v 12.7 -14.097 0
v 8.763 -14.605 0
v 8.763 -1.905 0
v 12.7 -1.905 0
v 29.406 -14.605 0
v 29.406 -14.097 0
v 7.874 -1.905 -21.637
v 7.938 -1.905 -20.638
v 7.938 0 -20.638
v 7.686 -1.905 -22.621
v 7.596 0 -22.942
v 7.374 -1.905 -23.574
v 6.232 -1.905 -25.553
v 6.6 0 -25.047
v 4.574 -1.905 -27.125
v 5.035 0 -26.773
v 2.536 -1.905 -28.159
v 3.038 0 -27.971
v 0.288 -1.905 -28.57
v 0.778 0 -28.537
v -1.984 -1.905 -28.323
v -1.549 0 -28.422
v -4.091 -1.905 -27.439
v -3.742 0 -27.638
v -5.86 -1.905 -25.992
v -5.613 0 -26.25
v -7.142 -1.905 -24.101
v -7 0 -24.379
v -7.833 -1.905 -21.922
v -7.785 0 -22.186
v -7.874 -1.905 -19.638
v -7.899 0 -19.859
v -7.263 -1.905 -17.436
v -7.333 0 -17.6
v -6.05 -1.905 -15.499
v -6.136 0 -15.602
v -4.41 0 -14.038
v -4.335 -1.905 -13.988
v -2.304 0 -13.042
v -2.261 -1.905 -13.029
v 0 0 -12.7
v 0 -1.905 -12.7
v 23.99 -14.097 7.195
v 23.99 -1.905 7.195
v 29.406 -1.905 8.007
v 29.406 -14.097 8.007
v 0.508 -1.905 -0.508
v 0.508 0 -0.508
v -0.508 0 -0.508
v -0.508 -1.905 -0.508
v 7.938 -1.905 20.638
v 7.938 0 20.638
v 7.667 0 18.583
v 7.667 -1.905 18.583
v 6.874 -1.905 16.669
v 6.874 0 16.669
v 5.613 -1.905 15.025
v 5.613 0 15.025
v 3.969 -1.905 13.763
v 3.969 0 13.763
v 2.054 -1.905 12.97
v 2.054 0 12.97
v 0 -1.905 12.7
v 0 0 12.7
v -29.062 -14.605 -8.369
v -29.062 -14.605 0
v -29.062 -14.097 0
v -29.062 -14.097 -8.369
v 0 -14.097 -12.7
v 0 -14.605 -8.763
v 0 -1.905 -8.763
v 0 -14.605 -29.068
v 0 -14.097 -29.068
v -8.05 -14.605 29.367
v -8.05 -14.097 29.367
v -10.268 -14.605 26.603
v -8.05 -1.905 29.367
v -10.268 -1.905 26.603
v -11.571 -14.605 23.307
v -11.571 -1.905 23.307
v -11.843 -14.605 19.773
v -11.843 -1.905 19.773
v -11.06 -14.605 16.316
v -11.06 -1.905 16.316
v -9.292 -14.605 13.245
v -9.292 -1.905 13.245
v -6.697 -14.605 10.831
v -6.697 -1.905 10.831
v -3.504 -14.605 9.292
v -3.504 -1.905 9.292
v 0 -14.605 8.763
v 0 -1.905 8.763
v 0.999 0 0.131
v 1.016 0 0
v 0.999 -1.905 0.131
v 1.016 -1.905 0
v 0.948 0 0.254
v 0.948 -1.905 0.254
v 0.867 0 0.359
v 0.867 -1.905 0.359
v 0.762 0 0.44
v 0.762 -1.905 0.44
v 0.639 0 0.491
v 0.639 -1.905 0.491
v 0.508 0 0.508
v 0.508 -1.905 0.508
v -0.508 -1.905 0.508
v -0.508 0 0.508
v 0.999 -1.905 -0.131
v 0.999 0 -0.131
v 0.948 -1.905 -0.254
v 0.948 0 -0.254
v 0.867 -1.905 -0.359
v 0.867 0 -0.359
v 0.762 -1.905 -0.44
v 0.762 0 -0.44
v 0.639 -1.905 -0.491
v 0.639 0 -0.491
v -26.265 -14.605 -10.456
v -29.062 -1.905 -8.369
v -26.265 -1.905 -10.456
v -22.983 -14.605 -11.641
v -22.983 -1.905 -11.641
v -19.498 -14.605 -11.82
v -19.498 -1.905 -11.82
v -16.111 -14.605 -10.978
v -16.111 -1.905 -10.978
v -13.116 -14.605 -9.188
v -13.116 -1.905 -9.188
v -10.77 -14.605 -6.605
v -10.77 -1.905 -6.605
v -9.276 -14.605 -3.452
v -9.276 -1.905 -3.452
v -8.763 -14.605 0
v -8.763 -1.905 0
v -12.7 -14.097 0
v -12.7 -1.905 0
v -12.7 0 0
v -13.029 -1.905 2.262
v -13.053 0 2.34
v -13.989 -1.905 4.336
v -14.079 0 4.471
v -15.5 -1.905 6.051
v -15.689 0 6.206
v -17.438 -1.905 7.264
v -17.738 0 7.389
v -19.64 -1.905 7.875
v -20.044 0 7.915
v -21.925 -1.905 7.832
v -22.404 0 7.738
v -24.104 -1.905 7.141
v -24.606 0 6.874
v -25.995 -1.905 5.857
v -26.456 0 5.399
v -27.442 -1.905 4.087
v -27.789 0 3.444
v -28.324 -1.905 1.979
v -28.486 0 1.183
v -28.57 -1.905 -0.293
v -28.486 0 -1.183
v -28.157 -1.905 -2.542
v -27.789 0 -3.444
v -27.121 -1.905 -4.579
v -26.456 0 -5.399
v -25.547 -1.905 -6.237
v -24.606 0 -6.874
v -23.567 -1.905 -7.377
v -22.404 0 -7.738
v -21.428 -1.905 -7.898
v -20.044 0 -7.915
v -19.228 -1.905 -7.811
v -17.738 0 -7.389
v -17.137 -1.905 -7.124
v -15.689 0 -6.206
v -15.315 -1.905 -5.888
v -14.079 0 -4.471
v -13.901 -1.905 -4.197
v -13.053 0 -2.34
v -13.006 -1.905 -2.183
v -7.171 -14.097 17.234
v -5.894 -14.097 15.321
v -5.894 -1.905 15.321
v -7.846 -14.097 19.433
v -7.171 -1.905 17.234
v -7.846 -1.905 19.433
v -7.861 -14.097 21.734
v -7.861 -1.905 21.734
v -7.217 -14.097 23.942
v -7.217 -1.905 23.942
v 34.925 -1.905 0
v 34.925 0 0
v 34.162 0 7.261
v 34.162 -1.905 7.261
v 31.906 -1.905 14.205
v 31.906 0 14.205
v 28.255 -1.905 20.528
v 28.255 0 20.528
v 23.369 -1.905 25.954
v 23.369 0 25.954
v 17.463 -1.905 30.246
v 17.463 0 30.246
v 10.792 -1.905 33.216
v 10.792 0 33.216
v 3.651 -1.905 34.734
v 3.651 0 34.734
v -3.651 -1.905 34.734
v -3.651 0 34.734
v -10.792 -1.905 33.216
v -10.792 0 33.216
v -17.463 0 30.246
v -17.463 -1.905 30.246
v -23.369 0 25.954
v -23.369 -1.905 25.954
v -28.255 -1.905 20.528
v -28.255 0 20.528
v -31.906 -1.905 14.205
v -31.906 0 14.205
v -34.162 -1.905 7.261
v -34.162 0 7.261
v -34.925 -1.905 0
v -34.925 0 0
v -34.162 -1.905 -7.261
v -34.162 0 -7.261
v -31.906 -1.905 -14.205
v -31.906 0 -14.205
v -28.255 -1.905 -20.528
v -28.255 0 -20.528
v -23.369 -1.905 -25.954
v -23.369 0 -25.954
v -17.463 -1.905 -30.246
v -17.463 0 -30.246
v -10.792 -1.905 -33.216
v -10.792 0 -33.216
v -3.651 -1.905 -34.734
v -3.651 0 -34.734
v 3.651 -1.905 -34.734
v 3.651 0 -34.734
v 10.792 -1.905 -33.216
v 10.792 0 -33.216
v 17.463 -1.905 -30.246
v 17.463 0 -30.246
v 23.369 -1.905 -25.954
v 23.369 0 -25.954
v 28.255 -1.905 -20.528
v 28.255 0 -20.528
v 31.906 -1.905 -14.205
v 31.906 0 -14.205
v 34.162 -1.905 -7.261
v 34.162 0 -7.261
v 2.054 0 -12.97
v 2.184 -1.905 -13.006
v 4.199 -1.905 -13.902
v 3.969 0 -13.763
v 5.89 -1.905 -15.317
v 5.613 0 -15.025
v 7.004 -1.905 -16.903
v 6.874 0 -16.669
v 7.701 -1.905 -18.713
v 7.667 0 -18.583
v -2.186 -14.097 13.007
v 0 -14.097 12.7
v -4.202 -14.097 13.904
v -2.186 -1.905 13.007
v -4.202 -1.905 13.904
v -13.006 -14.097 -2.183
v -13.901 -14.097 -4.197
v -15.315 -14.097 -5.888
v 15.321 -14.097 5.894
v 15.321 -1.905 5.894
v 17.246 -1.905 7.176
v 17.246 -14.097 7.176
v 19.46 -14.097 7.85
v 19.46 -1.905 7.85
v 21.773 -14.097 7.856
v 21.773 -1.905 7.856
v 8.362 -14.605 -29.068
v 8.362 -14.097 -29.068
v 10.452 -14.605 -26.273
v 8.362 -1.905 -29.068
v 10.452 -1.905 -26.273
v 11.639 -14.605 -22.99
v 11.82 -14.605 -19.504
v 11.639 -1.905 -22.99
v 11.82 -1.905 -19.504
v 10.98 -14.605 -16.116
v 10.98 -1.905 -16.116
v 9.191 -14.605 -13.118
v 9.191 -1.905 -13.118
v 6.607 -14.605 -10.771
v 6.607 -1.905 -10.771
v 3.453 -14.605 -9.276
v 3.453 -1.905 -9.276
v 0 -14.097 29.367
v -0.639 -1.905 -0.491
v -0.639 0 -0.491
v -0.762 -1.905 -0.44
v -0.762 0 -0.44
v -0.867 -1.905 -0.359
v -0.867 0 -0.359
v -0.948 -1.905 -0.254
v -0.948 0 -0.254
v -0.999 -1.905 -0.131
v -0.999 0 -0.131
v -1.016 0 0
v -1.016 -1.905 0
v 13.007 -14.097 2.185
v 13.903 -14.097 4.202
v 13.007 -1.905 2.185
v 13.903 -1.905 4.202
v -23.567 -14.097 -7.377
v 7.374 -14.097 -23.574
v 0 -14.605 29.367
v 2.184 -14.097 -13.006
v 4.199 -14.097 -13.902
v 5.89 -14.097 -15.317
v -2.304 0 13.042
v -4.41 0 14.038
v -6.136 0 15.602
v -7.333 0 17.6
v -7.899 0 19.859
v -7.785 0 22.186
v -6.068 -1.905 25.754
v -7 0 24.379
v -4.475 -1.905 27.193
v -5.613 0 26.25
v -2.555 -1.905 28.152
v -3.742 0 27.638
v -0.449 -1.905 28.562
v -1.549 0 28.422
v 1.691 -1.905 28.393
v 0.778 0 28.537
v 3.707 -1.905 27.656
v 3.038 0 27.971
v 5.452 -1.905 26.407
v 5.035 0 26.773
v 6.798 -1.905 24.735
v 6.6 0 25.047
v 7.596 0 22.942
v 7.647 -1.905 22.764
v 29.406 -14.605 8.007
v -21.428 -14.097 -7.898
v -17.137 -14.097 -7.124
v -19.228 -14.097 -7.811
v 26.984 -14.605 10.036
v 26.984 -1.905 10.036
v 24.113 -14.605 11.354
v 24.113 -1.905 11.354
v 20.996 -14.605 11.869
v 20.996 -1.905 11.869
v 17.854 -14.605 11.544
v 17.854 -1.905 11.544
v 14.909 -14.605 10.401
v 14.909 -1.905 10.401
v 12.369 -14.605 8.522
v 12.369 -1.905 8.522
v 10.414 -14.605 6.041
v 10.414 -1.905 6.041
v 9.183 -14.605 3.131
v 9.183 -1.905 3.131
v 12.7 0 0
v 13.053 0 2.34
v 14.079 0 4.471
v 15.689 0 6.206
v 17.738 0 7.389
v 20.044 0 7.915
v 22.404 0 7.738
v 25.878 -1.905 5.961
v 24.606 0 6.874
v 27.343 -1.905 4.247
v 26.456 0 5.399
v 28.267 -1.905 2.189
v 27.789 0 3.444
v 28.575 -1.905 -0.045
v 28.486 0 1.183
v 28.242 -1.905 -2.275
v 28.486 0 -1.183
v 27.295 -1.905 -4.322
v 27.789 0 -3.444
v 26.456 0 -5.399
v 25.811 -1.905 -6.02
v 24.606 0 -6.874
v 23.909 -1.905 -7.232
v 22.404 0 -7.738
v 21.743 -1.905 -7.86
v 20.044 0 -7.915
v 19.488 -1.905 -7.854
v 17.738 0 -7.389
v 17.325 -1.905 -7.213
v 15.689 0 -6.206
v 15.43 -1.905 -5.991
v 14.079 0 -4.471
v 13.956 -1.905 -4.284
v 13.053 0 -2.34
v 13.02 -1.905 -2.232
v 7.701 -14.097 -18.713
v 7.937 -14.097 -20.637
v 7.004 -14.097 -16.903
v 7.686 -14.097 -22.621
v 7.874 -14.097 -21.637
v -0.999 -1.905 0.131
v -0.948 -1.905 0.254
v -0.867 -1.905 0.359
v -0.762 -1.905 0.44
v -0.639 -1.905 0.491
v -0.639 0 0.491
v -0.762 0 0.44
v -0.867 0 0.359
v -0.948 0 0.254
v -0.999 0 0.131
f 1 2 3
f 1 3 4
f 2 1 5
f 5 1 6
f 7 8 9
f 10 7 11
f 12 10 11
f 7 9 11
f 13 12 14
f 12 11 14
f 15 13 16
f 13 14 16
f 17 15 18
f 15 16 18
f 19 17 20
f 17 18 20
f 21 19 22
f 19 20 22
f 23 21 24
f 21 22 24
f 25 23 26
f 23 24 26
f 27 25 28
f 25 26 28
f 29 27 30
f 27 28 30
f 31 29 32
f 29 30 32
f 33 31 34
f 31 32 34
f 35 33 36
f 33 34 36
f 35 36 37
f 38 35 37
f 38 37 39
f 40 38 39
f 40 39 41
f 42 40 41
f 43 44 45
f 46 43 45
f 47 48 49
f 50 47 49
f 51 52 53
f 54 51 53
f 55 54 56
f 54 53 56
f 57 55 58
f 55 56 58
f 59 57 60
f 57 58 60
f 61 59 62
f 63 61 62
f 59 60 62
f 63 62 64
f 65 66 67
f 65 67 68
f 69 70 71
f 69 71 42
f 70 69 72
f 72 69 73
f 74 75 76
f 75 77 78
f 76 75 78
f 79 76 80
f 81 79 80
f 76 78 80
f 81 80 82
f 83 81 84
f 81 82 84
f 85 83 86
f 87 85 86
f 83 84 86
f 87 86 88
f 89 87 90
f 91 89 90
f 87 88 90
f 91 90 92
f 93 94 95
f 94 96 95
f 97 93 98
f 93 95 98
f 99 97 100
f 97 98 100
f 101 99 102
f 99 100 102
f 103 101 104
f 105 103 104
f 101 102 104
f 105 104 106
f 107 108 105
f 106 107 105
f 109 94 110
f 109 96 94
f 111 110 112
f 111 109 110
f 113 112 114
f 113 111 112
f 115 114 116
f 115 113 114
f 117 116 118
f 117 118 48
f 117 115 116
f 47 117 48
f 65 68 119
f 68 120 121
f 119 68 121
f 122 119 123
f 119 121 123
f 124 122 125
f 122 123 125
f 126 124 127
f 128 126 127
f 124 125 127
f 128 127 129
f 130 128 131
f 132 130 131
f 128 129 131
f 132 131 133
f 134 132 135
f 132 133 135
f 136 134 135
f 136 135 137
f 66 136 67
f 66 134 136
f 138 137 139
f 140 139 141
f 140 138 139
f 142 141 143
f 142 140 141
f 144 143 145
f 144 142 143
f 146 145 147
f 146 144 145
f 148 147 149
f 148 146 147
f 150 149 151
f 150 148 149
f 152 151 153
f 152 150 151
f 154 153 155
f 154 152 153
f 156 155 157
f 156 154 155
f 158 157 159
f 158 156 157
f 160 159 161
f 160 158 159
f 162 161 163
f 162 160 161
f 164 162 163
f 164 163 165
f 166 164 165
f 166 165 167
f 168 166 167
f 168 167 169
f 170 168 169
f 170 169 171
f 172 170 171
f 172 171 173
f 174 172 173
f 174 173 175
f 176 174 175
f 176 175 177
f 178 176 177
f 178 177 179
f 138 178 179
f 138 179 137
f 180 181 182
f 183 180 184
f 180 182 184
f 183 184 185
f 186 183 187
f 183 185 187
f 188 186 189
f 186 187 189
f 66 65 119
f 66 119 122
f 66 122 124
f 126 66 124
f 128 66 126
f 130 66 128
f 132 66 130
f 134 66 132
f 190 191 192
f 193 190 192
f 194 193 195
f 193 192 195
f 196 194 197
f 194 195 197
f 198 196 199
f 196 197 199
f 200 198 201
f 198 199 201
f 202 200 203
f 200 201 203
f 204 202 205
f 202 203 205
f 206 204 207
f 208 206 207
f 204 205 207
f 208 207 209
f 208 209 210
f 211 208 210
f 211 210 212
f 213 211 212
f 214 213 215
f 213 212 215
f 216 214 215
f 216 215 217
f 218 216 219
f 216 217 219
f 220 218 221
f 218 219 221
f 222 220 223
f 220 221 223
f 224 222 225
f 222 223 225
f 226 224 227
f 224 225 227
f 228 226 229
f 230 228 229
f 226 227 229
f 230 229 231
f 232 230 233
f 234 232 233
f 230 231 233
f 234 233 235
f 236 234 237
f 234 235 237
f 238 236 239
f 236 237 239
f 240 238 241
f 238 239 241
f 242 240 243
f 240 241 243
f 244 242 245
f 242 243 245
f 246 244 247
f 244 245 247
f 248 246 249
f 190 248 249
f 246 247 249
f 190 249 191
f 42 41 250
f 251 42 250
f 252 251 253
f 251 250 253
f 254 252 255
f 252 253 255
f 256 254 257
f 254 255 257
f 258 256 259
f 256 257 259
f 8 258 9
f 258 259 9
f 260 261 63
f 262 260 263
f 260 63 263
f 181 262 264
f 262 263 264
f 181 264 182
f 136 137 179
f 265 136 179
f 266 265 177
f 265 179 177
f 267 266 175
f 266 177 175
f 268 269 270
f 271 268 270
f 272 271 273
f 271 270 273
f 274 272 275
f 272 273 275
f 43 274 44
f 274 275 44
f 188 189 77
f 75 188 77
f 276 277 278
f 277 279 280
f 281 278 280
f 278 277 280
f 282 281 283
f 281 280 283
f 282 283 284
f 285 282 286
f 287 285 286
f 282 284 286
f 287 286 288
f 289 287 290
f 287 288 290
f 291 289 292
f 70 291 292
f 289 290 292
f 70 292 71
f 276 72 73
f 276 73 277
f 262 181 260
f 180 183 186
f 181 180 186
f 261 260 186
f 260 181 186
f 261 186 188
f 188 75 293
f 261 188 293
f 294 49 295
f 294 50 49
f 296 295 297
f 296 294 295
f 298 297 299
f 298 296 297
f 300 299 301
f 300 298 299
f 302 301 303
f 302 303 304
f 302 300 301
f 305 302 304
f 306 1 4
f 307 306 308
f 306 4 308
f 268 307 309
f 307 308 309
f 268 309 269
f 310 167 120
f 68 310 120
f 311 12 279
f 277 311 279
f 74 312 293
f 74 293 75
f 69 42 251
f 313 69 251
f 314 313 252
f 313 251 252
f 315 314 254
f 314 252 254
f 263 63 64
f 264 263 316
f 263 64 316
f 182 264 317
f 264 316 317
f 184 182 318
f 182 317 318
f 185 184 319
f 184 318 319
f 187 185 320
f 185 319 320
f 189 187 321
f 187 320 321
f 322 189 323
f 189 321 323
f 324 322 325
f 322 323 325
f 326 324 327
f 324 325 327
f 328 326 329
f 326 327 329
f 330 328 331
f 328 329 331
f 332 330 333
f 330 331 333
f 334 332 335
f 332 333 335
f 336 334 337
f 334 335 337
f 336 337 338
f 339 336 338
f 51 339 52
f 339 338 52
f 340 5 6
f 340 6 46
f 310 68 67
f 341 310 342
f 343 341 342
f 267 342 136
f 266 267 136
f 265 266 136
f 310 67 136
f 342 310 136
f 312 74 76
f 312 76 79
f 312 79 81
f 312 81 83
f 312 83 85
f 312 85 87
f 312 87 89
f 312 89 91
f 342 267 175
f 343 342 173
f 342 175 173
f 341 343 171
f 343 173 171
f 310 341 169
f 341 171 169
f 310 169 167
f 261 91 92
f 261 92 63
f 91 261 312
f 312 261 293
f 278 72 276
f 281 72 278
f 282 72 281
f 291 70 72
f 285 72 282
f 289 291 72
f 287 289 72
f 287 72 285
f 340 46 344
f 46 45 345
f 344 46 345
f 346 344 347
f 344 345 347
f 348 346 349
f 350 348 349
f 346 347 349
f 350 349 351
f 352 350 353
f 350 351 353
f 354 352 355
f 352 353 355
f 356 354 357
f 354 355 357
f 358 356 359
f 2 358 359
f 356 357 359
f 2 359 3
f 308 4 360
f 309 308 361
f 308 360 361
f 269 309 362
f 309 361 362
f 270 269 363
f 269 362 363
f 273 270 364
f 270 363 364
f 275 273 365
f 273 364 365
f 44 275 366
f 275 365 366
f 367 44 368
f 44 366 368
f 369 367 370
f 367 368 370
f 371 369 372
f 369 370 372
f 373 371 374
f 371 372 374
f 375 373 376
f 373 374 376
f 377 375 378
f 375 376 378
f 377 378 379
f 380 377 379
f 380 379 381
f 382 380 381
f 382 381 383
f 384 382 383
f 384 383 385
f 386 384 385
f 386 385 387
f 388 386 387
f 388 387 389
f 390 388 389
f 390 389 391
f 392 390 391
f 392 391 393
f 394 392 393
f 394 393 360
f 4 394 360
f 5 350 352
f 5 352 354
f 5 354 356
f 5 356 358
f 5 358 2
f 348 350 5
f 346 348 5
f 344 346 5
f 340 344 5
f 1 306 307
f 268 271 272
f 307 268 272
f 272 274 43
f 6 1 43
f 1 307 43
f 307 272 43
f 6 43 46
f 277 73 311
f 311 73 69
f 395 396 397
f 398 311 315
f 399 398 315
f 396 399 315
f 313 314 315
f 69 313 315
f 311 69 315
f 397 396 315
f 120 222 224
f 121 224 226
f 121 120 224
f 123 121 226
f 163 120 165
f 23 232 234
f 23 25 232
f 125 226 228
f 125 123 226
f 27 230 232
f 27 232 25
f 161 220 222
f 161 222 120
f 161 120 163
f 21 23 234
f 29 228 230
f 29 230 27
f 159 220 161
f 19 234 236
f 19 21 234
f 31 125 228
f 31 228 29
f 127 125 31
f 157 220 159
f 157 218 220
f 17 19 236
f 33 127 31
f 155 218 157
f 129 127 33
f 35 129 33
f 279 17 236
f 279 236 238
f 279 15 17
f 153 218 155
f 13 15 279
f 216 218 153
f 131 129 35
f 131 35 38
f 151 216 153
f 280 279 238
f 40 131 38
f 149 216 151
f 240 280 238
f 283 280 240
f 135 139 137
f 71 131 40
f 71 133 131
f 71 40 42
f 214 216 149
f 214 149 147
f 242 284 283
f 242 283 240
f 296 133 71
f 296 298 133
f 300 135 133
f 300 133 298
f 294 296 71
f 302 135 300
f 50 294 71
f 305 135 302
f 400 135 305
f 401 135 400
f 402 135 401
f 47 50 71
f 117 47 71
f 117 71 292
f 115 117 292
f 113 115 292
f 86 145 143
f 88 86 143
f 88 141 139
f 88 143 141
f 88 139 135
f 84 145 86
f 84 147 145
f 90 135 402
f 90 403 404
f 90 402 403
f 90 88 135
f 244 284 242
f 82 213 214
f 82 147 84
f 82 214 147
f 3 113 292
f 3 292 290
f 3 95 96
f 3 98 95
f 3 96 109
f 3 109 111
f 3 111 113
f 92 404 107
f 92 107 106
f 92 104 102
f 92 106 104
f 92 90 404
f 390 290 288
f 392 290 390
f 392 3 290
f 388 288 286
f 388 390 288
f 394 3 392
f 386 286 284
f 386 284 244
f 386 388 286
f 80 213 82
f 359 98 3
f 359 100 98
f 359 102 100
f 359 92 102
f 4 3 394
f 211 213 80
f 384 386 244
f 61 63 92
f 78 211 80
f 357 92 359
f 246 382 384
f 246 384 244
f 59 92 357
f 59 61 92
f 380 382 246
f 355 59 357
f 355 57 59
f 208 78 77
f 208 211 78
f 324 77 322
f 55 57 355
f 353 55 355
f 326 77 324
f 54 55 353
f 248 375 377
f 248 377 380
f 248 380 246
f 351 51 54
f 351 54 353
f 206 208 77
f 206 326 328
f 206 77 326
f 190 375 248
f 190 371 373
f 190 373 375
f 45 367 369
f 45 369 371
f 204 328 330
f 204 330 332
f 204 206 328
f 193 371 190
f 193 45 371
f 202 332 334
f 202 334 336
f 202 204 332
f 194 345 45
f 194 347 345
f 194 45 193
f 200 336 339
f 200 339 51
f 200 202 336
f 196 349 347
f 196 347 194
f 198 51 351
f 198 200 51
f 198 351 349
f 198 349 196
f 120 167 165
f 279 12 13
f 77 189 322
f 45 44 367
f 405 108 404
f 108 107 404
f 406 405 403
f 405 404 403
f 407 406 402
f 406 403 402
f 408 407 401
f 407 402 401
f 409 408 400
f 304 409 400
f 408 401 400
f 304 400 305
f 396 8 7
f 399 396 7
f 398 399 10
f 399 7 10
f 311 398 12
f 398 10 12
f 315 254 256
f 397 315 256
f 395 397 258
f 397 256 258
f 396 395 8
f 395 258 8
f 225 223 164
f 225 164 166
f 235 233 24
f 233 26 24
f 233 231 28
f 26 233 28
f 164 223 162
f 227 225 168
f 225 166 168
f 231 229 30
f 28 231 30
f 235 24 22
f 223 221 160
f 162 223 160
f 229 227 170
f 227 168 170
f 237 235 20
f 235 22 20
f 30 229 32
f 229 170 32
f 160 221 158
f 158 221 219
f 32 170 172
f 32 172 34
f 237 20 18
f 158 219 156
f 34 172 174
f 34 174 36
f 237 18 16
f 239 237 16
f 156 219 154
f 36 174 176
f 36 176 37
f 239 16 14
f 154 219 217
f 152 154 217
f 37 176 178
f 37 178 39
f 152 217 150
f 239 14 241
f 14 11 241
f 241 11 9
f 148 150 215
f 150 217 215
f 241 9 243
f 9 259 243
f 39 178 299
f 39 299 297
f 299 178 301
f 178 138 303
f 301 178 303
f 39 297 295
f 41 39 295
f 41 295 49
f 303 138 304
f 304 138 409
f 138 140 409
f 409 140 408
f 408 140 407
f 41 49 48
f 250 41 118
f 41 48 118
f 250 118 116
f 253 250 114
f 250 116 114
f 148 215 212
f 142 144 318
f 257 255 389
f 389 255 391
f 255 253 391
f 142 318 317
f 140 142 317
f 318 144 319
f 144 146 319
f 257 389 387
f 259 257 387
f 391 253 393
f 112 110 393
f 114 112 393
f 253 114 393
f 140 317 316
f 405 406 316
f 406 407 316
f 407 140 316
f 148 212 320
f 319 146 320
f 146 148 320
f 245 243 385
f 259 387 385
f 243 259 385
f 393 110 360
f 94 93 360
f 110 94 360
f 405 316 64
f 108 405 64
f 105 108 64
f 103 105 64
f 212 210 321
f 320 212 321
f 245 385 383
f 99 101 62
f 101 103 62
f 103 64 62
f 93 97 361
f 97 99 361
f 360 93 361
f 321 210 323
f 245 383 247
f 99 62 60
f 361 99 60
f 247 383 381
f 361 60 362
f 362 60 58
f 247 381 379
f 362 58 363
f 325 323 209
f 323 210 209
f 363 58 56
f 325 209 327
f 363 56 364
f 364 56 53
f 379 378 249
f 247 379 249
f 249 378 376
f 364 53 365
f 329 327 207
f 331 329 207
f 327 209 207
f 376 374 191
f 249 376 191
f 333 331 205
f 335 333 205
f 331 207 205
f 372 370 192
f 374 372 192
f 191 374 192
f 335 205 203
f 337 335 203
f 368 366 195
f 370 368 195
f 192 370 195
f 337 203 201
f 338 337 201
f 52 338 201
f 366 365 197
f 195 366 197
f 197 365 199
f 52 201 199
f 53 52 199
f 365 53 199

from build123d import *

# Parameters (mm, degrees)
F0_R     = 34.925
F0_R_2   = 7.9375
F1_DEPTH = 1.905
F3_DEPTH = 12.7
F8_DEPTH = 0.508
F9_R     = 0.50799


# Not quite as in the source:
# - a fillet or chamfer is up to 0.001 mm smaller than in the source, because OpenCascade refuses the exact size


with BuildPart() as f1:
    # F0 (on Front) → F1 (new body)
    with BuildSketch(Plane.XZ):
        Circle(F0_R)
        with BuildLine():
            ThreePointArc((7.9375, -20.6375), (-5.6126600757, -26.2501600757), (0, -12.7))
            ThreePointArc((0, -12.7), (5.6126600757, -15.0248399243), (7.9375, -20.6375))
        make_face(mode=Mode.SUBTRACT)
        with Locations((-20.6375, 0)):
            Circle(F0_R_2, mode=Mode.SUBTRACT)
        Polygon((-1.016, 0), (-1.016, 0.508), (0, 0.508), (1.016, 0.508), (1.016, 0), (1.016, -0.508), (0, -0.508), (-1.016, -0.508), align=None, mode=Mode.SUBTRACT)
        with BuildLine():
            ThreePointArc((28.575, 0), (20.6375, -7.9375), (12.7, 0))
            ThreePointArc((12.7, 0), (20.6375, 7.9375), (28.575, 0))
        make_face(mode=Mode.SUBTRACT)
        with BuildLine():
            ThreePointArc((7.9375, 20.6375), (5.6126600757, 15.0248399243), (0, 12.7))
            ThreePointArc((0, 12.7), (-5.6126600757, 26.2501600757), (7.9375, 20.6375))
        make_face(mode=Mode.SUBTRACT)
    extrude(amount=F1_DEPTH)

    # F2 (on face) → F3 (join)
    with BuildSketch(Plane.XZ.offset(1.905)):
        with BuildLine():
            Line((-7.217116123, 23.9416097315), (-8.0497858212, 29.3670302556))
            ThreePointArc((-8.0497858212, 29.3670302556), (-11.0603471299, 16.316334461), (0, 8.763))
            Line((0, 8.763), (0, 12.7))
            ThreePointArc((0, 12.7), (-3.2253143504, 13.384827831), (-5.894084441, 15.3211408274))
            ThreePointArc((-5.894084441, 15.3211408274), (-7.8456367548, 19.4333861511), (-7.217116123, 23.9416097315))
        make_face()
        with BuildLine():
            Line((-23.5666824339, -7.3772485737), (-29.061654765, -8.3688330575))
            ThreePointArc((-29.061654765, -8.3688330575), (-16.1114020949, -10.9780776097), (-8.763, 0))
            Line((-8.763, 0), (-12.7, 0))
            ThreePointArc((-12.7, 0), (-13.3830221995, -3.2212510135), (-15.3145406216, -5.8881244642))
            ThreePointArc((-15.3145406216, -5.8881244642), (-19.2279203931, -7.8113373747), (-23.5666824339, -7.3772485737))
        make_face()
        with BuildLine():
            Line((23.9903295305, 7.1946118999), (29.4060203782, 8.0072967115))
            ThreePointArc((29.4060203782, 8.0072967115), (16.3432040729, 11.0708072308), (8.763, 0))
            Line((8.763, 0), (12.7, 0))
            ThreePointArc((12.7, 0), (13.384689213, 3.225002626), (15.3206341891, 5.8936274228))
            ThreePointArc((15.3206341891, 5.8936274228), (19.4595781944, 7.8496118675), (23.9903295305, 7.1946118999))
        make_face()
        with BuildLine():
            Line((7.374412056, -23.5738162429), (8.3621654342, -29.0682733631))
            ThreePointArc((8.3621654342, -29.0682733631), (10.9798672248, -16.1157452549), (0, -8.763))
            Line((0, -8.763), (0, -12.7))
            ThreePointArc((0, -12.7), (3.2225232211, -13.3835872393), (5.8899911345, -15.3166062137))
            ThreePointArc((5.8899911345, -15.3166062137), (7.4079589254, -17.786877119), (7.9375, -20.6375))
            ThreePointArc((7.9375, -20.6375), (7.7954570727, -22.1324097892), (7.374412056, -23.5738162429))
        make_face()
    extrude(amount=F3_DEPTH)

    # F4 (on face) + F7 (on face) + F6 (on face) + F5 (on face) → F8 (join)
    with BuildSketch(Plane.XZ.offset(14.605)):
        with BuildLine():
            Line((-12.7, 0), (-20.6375, 0))
            Line((-20.6375, 0), (-23.5666824339, 0))
            Line((-23.5666824339, 0), (-23.5666824339, -7.3772485737))
            ThreePointArc((-23.5666824339, -7.3772485737), (-16.1791639494, -6.567126153), (-12.7, 0))
        make_face()
        Polygon((-23.5666824339, -7.3772485737), (-23.5666824339, 0), (-29.061654765, 0), (-29.061654765, -8.3688330575), align=None)
    with BuildSketch(Plane.XZ.offset(14.605)):
        with BuildLine():
            Line((0, 23.9416097315), (-7.217116123, 23.9416097315))
            ThreePointArc((-7.217116123, 23.9416097315), (-6.6794564616, 16.3492873621), (0, 12.7))
            Line((0, 12.7), (0, 20.6375))
            Line((0, 20.6375), (0, 23.9416097315))
        make_face()
        Polygon((-8.0497858212, 29.3670302556), (-7.217116123, 23.9416097315), (0, 23.9416097315), (0, 29.3670302556), align=None)
    with BuildSketch(Plane.XZ.offset(14.605)):
        with BuildLine():
            ThreePointArc((23.9903295305, 7.1946118999), (16.3718920801, 6.6939147981), (12.7, 0))
            Line((12.7, 0), (20.6375, 0))
            Line((20.6375, 0), (23.9903295305, 0))
            Line((23.9903295305, 0), (23.9903295305, 7.1946118999))
        make_face()
        Polygon((29.4060203782, 8.0072967115), (23.9903295305, 7.1946118999), (23.9903295305, 0), (29.4060203782, 0), align=None)
    with BuildSketch(Plane.XZ.offset(14.605)):
        with BuildLine():
            Line((0, -12.7), (0, -20.6375))
            Line((0, -20.6375), (0, -23.5738162429))
            Line((0, -23.5738162429), (7.374412056, -23.5738162429))
            ThreePointArc((7.374412056, -23.5738162429), (6.5692814077, -16.1823402906), (0, -12.7))
        make_face()
        Polygon((7.374412056, -23.5738162429), (0, -23.5738162429), (0, -29.0682733631), (8.3621654342, -29.0682733631), align=None)
    extrude(amount=-F8_DEPTH)

    # F9 (radius 0.508 in the source; OpenCascade refuses exactly that, so slightly less here)
    f9_edges = [f1.edges().sort_by_distance(p)[0] for p in [
        (1.016, -0.9525, 0.508),
        (1.016, -0.9525, -0.508),
        (-1.016, -0.9525, -0.508),
        (-1.016, -0.9525, 0.508),
    ]]
    fillet(f9_edges, radius=F9_R)


solid = f1.part
